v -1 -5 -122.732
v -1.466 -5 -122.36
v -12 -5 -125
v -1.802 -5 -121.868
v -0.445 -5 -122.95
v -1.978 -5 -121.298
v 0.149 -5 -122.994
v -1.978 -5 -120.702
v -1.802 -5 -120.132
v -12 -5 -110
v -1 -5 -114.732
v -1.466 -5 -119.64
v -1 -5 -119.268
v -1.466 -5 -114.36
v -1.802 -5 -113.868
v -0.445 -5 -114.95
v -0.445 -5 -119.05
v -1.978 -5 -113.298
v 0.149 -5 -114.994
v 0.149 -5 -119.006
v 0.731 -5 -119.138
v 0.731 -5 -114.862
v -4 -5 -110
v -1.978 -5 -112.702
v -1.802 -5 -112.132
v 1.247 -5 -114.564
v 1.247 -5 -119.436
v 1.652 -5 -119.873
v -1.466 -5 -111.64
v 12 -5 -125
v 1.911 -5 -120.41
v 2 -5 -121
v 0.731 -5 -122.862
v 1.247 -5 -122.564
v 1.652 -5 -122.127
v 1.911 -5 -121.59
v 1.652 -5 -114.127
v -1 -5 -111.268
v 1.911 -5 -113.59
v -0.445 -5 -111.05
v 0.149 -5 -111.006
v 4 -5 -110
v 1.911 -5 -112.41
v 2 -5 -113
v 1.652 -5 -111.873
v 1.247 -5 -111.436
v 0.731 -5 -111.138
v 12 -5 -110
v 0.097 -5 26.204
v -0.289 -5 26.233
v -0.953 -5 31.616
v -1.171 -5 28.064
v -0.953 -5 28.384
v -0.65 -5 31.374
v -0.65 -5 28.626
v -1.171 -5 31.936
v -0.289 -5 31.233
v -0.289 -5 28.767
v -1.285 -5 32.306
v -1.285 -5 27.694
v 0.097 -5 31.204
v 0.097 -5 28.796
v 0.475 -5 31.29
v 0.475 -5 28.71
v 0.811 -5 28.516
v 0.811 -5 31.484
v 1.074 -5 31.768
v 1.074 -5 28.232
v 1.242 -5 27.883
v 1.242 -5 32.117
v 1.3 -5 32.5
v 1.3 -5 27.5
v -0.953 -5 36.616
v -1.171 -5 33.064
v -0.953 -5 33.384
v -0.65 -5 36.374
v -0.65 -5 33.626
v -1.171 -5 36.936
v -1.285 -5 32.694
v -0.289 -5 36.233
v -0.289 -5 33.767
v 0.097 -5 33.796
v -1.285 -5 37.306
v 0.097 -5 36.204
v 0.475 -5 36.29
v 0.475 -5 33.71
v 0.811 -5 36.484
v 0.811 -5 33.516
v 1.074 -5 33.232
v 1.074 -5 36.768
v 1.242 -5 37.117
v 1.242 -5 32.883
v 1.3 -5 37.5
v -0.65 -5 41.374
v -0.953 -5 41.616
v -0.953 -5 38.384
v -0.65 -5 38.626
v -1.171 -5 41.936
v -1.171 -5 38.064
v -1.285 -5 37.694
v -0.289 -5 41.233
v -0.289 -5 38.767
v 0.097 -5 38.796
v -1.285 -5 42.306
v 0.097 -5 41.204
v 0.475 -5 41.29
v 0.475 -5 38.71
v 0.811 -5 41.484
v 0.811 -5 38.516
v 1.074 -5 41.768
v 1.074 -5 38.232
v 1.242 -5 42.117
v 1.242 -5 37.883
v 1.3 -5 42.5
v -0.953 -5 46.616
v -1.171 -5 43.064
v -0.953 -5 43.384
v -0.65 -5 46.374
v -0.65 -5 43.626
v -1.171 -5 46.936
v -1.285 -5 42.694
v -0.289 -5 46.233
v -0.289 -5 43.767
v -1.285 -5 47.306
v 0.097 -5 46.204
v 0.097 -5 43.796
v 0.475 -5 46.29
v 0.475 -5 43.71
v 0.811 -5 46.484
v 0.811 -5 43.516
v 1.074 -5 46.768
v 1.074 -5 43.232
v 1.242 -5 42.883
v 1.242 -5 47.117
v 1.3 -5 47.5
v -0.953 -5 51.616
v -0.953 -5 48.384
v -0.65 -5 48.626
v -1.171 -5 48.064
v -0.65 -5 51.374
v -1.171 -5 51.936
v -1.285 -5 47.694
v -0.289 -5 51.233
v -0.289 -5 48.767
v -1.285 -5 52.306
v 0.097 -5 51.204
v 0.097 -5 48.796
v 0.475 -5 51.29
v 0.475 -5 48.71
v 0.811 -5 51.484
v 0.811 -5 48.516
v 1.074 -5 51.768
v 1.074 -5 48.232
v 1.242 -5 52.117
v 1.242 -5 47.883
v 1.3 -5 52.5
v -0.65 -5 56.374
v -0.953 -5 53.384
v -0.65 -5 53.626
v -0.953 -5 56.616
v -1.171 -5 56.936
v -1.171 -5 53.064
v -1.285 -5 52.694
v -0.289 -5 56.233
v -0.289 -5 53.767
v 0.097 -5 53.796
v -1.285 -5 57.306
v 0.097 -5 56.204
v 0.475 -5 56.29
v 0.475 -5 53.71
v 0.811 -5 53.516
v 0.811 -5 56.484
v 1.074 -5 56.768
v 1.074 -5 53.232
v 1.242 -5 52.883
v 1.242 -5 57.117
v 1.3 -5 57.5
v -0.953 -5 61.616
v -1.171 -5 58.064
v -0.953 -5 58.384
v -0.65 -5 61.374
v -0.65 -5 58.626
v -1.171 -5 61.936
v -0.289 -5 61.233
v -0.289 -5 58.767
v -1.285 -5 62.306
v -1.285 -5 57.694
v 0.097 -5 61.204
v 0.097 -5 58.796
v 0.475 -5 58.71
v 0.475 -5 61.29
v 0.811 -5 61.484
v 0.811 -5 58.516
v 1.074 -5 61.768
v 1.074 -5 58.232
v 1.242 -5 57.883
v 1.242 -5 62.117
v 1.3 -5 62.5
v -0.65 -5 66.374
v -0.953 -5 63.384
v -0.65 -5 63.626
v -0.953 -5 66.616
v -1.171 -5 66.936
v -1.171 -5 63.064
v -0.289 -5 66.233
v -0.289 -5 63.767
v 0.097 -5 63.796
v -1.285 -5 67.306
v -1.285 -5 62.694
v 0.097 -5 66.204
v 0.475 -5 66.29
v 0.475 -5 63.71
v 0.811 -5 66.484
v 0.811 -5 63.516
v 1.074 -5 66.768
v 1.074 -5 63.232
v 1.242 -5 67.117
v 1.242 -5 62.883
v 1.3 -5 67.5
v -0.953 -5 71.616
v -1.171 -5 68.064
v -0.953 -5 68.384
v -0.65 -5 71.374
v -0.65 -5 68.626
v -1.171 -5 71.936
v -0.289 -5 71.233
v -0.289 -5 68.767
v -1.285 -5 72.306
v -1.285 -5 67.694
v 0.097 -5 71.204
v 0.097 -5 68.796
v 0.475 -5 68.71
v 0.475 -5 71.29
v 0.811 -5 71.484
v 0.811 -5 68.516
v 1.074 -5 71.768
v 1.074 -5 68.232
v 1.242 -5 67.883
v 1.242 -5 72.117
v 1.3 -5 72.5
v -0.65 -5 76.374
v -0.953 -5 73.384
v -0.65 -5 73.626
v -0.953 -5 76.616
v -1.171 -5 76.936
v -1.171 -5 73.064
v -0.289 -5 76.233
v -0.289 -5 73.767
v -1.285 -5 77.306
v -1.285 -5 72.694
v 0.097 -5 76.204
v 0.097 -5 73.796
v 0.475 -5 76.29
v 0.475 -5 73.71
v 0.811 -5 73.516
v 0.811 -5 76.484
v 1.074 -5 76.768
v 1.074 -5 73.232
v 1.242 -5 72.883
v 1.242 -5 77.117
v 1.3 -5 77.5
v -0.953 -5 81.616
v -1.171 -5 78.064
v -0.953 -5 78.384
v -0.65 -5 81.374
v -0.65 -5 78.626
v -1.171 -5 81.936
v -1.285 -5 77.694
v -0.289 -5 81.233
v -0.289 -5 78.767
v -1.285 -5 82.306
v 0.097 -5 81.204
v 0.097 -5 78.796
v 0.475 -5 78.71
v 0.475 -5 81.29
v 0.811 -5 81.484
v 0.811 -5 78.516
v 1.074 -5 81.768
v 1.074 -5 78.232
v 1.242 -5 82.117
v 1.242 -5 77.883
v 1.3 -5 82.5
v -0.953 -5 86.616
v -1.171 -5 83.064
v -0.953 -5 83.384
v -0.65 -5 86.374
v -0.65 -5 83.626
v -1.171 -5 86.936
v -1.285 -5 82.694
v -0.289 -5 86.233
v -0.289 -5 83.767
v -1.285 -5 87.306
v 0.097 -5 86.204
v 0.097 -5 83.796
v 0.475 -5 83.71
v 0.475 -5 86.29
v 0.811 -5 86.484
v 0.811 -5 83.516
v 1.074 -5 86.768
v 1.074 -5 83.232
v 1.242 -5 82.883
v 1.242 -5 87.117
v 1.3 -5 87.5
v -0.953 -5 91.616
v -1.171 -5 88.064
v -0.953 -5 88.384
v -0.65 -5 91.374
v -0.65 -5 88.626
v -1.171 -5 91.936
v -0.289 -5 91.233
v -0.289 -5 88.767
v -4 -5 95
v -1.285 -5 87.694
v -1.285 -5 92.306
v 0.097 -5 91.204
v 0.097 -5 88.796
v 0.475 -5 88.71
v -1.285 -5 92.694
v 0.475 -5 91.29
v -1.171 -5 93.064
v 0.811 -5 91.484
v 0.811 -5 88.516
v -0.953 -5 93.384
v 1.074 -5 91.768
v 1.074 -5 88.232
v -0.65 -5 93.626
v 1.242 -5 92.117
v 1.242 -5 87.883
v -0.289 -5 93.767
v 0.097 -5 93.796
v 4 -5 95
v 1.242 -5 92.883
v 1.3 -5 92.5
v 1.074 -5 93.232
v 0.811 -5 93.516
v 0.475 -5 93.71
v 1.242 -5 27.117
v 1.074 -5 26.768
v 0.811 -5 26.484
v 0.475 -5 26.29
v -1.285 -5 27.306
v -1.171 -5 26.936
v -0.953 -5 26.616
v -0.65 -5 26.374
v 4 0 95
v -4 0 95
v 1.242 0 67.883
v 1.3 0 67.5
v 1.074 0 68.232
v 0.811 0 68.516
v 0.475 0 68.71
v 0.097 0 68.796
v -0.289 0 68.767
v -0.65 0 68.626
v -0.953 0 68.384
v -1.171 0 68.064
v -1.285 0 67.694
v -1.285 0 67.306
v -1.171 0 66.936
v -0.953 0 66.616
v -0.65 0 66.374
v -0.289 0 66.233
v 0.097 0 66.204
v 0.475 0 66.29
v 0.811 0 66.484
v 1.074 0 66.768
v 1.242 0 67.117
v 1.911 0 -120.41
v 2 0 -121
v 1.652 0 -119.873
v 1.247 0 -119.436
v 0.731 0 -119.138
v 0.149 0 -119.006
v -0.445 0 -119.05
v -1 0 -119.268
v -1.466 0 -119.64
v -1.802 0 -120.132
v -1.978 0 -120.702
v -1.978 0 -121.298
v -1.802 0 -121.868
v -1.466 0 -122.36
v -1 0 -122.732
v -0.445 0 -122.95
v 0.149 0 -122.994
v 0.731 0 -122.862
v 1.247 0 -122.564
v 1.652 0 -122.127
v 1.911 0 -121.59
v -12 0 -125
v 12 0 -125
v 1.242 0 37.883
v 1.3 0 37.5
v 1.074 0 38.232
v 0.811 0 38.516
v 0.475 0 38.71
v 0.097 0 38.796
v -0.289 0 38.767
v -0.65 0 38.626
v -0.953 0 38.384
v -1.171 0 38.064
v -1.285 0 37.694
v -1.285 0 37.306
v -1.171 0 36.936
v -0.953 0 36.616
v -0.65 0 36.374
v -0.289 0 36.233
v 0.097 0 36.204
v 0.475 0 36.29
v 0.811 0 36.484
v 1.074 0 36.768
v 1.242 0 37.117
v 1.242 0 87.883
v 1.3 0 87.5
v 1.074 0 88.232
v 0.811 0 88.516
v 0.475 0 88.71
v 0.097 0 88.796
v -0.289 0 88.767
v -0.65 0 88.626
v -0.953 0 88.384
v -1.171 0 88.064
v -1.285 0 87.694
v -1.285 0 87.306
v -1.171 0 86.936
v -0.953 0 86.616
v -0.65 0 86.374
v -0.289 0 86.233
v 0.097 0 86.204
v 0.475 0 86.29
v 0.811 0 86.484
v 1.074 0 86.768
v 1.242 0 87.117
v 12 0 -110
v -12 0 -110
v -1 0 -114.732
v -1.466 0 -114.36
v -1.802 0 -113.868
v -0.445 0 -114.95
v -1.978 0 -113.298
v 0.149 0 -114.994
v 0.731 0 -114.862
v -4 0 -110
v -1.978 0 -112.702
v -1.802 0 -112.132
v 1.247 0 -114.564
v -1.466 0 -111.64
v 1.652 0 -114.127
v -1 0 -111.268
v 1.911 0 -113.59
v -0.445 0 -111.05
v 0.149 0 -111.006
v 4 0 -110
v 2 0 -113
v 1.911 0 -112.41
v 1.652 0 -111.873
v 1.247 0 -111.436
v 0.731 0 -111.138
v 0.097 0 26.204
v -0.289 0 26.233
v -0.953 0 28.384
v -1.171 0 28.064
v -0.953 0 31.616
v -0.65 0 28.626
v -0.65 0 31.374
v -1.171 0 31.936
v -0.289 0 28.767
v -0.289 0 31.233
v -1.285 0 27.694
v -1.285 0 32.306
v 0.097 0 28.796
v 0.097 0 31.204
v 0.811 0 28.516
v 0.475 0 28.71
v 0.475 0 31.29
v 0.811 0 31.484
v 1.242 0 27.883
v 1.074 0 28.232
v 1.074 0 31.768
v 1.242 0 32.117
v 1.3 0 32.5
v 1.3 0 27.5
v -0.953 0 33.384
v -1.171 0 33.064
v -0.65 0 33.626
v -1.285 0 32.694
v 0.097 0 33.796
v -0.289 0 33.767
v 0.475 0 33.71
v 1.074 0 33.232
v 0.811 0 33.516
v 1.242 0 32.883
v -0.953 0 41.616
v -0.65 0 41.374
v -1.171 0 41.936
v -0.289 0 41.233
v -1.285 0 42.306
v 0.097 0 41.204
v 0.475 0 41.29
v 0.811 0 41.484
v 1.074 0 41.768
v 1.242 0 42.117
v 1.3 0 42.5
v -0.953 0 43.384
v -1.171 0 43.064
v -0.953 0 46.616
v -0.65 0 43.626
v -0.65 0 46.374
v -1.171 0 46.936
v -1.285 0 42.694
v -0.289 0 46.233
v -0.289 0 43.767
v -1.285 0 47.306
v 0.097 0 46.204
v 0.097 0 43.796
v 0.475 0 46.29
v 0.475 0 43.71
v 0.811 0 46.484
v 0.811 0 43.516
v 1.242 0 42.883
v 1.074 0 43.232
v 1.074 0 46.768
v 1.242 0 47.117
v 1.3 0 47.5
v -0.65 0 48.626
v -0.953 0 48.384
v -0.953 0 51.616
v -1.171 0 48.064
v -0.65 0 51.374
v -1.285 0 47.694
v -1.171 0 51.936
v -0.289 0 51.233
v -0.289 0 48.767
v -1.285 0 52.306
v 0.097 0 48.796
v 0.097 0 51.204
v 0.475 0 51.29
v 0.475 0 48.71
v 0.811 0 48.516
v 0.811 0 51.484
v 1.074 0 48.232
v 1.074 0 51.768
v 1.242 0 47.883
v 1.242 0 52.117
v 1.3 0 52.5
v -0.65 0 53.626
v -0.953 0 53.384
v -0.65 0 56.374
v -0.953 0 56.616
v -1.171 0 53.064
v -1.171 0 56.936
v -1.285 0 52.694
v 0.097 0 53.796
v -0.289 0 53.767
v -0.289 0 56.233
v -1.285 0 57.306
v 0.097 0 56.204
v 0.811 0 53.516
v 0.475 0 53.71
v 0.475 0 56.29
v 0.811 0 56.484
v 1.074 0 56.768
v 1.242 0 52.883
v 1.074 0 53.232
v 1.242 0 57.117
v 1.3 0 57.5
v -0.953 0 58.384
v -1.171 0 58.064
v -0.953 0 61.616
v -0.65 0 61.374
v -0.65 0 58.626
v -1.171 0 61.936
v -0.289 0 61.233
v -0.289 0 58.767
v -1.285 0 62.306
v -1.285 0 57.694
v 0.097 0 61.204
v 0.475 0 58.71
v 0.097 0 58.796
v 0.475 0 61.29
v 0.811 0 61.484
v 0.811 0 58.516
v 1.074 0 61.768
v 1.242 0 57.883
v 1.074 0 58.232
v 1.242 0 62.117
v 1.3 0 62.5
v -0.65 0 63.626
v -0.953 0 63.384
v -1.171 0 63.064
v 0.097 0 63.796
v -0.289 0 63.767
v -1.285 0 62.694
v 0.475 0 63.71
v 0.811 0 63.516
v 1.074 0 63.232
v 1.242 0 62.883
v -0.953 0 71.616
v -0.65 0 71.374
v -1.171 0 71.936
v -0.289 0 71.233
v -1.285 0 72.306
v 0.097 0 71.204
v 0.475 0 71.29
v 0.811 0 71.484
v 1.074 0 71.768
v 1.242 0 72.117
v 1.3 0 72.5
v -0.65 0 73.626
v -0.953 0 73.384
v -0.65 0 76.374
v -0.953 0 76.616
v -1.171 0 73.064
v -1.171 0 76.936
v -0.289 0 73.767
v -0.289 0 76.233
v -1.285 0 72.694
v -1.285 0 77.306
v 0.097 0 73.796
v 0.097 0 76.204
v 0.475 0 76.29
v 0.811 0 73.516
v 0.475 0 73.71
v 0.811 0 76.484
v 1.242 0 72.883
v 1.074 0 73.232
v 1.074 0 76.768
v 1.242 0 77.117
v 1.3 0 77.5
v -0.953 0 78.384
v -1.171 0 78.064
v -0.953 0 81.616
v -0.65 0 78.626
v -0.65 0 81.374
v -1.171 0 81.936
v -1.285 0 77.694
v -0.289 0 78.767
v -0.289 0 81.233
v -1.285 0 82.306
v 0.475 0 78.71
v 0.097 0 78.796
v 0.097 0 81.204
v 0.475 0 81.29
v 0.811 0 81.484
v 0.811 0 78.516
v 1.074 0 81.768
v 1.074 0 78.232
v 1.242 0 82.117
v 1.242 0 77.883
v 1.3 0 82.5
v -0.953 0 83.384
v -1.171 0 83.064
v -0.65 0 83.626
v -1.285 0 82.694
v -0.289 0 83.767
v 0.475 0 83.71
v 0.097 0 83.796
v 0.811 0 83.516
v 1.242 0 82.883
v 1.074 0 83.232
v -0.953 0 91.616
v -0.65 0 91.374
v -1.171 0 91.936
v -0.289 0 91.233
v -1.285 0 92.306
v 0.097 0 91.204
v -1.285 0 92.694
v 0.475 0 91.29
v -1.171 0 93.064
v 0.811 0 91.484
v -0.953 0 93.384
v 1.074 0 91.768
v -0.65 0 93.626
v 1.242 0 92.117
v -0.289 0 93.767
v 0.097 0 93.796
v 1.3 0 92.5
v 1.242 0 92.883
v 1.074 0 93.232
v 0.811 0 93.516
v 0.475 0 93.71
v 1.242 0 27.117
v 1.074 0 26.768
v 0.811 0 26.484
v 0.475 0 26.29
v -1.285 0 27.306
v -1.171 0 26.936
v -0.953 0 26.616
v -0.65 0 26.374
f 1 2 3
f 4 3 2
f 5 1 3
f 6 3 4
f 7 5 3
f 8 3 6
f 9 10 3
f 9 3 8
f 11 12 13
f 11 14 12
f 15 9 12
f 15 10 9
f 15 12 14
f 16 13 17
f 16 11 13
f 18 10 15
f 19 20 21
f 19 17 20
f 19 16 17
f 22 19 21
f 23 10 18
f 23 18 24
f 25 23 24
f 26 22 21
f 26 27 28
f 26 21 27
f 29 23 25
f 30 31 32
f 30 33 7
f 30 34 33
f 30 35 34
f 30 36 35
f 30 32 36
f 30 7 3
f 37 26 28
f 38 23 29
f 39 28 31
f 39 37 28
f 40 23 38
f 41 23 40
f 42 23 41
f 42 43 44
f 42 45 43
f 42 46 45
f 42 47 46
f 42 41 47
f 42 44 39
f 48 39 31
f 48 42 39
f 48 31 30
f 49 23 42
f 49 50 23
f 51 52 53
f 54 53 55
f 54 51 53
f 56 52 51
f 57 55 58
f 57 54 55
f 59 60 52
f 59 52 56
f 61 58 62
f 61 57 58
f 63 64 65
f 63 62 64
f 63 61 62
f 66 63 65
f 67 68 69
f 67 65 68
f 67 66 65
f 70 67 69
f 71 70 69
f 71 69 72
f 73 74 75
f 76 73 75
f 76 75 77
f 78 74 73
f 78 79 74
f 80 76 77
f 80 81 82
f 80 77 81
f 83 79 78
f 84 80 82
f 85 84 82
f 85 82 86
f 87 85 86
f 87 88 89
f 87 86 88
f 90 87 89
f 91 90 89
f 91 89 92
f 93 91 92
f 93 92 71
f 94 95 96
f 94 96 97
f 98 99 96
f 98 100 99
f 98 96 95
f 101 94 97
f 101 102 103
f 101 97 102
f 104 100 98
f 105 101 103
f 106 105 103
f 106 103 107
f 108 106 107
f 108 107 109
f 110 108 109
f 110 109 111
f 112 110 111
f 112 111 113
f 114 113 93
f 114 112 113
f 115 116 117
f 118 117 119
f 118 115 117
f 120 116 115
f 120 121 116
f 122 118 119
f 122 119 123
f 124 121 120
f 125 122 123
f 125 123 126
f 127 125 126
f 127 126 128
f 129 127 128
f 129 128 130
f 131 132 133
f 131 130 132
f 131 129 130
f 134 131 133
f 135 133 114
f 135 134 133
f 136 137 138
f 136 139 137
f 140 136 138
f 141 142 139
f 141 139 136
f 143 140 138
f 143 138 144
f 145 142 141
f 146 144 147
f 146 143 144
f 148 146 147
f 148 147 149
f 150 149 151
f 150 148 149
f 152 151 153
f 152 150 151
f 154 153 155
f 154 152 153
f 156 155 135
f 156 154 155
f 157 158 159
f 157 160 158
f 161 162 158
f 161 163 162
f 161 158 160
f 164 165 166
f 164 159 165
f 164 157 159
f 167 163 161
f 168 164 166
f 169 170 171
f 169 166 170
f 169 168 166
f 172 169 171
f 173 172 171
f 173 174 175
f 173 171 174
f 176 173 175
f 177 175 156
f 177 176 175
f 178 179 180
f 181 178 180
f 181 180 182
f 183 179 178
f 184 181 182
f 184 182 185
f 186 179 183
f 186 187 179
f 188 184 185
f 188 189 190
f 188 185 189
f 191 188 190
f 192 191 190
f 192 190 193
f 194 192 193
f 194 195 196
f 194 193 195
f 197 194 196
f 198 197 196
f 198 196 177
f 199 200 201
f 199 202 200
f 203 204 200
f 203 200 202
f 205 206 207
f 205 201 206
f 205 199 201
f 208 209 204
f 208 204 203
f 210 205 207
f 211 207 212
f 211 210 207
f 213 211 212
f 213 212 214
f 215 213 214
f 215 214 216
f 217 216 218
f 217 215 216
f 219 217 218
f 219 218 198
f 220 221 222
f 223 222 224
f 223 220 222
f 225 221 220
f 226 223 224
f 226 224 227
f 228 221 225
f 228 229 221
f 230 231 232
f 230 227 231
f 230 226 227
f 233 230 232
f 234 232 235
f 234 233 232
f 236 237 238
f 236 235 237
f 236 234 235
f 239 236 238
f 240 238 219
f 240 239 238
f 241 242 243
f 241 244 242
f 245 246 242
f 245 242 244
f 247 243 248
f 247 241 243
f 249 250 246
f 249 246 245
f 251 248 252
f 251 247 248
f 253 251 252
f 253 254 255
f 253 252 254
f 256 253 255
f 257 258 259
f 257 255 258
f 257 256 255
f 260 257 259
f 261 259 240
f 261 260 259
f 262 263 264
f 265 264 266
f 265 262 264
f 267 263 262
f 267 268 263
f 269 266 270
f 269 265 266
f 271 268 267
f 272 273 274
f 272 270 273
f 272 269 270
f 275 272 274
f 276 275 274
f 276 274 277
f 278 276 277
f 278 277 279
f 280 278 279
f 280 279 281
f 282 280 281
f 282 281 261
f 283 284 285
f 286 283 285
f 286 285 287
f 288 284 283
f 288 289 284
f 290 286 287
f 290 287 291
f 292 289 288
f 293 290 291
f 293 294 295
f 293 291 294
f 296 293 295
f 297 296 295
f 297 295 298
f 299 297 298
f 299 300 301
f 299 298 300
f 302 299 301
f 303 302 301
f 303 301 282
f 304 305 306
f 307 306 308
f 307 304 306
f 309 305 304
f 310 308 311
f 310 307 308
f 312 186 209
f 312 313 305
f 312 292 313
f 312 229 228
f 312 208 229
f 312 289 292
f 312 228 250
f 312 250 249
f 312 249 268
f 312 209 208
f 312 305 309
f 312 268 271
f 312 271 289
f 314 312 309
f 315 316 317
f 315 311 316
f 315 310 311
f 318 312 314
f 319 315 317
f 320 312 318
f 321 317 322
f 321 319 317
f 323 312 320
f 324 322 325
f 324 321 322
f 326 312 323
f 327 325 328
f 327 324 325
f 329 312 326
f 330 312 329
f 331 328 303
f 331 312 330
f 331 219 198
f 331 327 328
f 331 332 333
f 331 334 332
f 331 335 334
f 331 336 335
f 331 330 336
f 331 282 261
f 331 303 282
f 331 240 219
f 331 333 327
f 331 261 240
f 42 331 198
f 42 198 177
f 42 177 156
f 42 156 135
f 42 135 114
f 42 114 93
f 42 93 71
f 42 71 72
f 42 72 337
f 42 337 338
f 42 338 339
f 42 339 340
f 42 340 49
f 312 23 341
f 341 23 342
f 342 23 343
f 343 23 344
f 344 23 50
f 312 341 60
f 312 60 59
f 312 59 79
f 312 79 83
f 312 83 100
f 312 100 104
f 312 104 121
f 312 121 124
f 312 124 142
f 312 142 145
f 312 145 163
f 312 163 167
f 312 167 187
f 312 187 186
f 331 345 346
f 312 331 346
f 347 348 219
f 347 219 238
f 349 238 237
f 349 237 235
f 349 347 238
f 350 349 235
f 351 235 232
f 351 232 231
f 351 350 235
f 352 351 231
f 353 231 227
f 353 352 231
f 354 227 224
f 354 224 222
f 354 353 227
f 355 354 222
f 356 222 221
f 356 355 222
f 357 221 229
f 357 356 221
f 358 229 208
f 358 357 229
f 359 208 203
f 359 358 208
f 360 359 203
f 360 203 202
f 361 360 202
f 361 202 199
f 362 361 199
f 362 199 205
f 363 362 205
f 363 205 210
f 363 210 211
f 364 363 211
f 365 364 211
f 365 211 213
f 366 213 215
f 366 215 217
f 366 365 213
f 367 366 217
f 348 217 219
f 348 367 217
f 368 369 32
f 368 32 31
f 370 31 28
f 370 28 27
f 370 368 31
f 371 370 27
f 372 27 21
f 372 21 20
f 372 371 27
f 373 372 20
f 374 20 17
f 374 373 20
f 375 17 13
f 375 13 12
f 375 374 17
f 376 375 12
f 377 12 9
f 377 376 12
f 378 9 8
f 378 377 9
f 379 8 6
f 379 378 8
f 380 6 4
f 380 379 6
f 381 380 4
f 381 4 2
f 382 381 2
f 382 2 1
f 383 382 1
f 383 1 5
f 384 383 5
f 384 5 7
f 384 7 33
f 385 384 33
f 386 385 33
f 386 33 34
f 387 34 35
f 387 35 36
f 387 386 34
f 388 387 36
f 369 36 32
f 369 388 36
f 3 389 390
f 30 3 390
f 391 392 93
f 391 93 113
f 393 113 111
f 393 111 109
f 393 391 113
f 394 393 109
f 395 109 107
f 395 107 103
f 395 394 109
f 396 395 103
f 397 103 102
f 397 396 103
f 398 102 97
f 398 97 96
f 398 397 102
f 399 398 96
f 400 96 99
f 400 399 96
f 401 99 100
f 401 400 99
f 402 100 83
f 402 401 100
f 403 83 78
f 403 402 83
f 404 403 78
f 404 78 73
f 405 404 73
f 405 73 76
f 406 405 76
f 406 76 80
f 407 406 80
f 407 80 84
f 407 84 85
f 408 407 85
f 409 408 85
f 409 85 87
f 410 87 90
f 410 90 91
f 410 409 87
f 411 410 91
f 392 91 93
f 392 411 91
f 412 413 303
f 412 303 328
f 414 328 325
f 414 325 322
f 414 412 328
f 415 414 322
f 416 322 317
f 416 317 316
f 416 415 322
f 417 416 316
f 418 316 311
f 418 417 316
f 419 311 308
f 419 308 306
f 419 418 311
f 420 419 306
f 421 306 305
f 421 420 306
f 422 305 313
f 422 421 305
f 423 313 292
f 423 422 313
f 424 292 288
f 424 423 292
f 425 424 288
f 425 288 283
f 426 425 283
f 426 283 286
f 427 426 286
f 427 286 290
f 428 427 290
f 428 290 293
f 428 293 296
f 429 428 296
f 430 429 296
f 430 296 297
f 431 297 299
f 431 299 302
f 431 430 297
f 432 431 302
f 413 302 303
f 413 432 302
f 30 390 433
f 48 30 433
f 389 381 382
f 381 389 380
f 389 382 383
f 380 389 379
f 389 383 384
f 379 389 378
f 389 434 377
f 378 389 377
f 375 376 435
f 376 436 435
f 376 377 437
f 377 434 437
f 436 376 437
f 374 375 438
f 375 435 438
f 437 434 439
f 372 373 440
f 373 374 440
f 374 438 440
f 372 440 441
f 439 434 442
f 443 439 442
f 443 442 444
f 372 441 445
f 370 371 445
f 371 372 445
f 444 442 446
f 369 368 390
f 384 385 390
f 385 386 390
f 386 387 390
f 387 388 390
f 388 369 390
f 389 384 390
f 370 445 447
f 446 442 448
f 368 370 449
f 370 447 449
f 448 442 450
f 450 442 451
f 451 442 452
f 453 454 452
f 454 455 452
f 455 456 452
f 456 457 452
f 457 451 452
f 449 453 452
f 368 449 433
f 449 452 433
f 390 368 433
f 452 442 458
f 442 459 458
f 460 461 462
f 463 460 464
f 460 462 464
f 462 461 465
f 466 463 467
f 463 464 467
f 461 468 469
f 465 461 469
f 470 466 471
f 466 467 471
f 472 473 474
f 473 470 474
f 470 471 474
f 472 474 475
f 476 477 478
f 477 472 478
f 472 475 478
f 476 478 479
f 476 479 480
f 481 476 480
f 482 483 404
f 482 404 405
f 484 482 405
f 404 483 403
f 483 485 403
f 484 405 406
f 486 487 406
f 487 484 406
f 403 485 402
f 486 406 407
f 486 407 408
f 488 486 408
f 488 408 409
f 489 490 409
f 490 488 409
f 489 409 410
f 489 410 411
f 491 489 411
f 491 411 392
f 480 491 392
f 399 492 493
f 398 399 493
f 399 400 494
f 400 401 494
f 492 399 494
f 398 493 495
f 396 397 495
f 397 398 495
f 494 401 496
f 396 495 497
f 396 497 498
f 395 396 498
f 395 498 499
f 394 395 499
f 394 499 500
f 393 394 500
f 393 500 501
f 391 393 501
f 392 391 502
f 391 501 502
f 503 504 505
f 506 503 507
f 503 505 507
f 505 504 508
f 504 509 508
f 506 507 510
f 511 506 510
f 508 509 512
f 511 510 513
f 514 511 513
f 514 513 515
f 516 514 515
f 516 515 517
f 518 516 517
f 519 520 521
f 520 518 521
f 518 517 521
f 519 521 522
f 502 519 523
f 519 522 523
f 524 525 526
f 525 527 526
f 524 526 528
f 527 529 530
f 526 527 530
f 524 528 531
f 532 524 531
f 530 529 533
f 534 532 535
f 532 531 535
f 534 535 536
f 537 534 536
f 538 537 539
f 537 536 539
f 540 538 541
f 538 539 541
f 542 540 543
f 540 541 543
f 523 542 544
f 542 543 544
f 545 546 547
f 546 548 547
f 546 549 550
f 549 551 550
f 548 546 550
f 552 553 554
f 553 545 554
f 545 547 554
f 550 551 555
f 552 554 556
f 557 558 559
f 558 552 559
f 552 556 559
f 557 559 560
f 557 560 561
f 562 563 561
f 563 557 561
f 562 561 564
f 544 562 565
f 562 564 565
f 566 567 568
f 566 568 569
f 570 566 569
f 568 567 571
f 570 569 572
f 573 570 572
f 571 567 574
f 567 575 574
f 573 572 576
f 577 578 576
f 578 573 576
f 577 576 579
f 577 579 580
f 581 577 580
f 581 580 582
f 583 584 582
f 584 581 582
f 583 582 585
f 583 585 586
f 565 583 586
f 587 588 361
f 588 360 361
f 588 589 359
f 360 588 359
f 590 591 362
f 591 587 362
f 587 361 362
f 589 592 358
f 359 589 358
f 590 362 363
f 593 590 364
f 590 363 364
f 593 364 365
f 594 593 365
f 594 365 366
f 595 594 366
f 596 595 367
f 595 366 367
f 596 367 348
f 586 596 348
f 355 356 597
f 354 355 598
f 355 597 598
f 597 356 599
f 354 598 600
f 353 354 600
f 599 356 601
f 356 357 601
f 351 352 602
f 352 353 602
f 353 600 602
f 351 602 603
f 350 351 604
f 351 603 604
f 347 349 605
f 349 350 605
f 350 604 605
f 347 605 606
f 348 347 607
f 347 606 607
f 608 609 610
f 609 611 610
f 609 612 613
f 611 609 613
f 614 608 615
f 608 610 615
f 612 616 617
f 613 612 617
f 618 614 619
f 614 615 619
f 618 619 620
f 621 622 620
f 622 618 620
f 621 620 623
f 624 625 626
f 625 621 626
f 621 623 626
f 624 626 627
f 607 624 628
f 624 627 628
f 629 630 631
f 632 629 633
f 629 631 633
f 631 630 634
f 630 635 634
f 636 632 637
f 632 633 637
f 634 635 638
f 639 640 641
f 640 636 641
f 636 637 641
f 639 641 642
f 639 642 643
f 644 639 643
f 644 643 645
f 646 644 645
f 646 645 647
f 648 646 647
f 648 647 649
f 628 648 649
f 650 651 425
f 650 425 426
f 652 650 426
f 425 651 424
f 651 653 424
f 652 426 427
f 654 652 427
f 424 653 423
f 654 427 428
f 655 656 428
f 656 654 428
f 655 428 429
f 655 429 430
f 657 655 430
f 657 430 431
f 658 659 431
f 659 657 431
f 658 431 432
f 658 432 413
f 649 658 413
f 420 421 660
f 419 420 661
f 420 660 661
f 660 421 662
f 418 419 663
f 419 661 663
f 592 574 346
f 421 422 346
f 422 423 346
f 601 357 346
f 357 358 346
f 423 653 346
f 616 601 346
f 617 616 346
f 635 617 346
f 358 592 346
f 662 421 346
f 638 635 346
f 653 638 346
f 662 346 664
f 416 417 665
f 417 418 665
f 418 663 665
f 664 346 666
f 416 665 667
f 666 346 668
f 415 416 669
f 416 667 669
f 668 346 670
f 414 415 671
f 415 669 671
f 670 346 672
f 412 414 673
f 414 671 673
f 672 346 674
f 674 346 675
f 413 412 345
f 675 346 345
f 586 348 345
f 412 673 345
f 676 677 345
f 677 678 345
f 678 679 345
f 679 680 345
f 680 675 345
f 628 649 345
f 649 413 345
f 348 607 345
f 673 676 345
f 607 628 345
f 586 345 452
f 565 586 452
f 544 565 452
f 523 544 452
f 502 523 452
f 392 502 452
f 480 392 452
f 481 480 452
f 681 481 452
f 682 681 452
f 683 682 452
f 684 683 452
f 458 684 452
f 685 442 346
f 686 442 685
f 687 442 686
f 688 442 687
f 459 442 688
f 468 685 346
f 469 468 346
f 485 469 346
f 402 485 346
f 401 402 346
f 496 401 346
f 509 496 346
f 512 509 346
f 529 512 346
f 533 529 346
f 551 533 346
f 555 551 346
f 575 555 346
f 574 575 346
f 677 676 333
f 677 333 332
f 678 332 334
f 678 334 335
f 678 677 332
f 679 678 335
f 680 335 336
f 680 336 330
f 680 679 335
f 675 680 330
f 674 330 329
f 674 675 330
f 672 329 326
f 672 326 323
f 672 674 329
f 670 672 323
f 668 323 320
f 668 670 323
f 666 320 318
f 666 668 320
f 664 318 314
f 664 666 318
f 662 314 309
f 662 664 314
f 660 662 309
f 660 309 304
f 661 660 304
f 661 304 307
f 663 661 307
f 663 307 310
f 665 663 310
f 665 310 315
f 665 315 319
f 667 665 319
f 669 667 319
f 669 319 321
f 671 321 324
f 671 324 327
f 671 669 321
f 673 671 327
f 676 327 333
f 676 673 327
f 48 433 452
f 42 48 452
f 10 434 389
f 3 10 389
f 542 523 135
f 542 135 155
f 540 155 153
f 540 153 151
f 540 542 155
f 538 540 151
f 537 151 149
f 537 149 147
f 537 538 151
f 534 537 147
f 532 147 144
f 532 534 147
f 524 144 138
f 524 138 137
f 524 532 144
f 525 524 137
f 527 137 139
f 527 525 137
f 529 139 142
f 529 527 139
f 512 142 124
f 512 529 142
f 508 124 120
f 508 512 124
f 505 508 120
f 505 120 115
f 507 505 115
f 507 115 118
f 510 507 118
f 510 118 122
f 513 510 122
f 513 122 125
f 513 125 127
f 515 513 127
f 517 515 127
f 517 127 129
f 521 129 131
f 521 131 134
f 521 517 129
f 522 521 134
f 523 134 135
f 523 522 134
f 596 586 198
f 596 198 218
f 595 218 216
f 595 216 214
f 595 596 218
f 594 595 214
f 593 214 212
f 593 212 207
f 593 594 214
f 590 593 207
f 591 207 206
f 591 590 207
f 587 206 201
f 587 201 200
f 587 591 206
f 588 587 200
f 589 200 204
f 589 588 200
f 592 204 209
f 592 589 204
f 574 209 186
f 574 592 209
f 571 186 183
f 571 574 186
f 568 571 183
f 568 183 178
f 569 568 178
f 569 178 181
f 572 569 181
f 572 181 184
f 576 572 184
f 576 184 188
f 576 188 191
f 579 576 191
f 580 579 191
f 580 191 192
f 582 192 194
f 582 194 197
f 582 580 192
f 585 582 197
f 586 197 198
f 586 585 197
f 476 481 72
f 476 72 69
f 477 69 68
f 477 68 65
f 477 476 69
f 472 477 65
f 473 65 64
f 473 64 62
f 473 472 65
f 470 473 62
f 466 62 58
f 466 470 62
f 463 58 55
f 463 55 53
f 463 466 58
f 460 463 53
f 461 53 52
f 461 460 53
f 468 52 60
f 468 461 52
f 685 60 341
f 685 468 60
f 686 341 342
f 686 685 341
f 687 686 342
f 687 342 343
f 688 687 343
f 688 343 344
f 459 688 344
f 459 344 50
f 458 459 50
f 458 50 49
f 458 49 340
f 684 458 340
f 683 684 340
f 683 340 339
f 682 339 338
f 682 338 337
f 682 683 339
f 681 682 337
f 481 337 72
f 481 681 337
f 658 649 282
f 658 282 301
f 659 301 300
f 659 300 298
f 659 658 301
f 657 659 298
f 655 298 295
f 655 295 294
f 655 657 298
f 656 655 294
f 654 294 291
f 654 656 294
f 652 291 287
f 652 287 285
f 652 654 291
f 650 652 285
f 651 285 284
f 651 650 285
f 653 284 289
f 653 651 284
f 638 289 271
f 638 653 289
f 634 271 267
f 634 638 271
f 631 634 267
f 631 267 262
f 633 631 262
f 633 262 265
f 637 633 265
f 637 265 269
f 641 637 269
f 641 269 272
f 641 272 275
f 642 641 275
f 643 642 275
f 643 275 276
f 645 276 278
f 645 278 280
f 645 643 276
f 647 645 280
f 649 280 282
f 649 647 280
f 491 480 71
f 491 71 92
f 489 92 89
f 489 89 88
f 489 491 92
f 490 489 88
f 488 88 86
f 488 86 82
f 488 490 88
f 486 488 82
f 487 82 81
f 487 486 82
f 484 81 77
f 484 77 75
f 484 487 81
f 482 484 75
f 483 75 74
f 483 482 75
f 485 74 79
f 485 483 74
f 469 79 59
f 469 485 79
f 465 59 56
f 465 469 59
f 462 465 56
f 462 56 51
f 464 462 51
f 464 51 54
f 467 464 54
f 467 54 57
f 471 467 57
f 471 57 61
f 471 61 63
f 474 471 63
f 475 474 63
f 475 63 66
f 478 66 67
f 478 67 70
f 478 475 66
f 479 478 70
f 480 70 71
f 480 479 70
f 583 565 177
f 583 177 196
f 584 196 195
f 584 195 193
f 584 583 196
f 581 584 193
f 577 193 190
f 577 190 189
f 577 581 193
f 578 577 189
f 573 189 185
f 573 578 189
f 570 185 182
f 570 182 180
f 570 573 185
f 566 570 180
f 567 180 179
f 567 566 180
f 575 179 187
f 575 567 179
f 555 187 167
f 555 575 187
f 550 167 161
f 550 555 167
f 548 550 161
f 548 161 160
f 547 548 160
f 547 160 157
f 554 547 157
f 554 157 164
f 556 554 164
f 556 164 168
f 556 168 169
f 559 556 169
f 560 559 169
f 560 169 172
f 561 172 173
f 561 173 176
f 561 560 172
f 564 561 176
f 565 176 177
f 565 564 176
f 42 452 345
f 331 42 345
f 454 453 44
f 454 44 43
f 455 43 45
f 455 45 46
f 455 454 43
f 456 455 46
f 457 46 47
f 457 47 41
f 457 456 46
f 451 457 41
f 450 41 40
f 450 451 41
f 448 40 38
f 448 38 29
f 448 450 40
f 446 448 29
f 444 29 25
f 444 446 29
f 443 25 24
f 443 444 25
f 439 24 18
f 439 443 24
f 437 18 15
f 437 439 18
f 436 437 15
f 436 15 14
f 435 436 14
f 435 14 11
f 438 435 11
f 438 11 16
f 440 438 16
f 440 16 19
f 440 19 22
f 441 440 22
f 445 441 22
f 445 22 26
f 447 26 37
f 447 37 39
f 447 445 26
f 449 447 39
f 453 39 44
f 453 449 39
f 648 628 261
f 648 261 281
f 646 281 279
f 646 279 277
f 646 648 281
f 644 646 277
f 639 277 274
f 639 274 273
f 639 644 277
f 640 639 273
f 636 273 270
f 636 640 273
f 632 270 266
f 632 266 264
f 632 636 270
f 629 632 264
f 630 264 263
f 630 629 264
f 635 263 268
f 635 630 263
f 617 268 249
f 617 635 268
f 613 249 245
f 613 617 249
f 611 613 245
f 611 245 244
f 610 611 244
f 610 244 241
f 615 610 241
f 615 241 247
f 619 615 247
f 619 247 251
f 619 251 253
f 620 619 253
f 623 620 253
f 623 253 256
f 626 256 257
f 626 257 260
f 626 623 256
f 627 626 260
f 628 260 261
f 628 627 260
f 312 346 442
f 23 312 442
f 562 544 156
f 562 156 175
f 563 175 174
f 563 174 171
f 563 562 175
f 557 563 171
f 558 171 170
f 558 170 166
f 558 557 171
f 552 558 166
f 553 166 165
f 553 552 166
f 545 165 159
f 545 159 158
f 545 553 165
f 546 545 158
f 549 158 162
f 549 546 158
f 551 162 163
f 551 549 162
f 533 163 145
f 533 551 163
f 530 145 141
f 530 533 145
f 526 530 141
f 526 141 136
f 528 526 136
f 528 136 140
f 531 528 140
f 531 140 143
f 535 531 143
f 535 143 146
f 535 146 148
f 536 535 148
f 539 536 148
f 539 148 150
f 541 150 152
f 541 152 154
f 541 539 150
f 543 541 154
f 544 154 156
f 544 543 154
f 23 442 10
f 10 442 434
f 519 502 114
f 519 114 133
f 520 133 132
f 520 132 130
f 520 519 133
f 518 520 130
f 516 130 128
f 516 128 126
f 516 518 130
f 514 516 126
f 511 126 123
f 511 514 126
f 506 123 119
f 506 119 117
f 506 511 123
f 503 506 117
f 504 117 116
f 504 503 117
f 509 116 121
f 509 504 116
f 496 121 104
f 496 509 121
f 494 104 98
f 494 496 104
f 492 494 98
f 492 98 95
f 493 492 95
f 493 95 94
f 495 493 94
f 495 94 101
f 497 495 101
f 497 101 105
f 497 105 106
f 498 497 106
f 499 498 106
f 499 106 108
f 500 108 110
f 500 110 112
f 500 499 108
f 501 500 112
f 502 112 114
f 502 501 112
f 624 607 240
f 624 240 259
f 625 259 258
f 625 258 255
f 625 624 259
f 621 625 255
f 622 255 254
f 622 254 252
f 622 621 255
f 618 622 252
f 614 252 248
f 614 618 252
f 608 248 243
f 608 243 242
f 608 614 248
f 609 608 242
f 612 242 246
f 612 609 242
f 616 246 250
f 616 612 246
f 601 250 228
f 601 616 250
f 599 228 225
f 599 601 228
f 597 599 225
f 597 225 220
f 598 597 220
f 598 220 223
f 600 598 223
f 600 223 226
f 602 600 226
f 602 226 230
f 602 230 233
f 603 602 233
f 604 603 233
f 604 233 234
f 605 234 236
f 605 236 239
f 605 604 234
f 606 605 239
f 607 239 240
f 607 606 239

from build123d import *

# Parameters (mm, degrees)
F0_R     = 2
F0_R_2   = 1.3
F1_DEPTH = 5


with BuildPart() as f1:
    # F0 (on Front) → F1 (new body)
    with BuildSketch(Plane.XZ):
        Polygon((-4, -125), (4, -125), (12, -125), (12, -110), (4, -110), (4, 95), (-4, 95), (-4, -110), (-12, -110), (-12, -125), align=None)
        with Locations((0, -121)):
            Circle(F0_R, mode=Mode.SUBTRACT)
        with Locations((0, -113)):
            Circle(F0_R, mode=Mode.SUBTRACT)
        with Locations((0, 27.5)):
            Circle(F0_R_2, mode=Mode.SUBTRACT)
        with Locations((0, 32.5)):
            Circle(F0_R_2, mode=Mode.SUBTRACT)
        with Locations((0, 37.5)):
            Circle(F0_R_2, mode=Mode.SUBTRACT)
        with Locations((0, 42.5)):
            Circle(F0_R_2, mode=Mode.SUBTRACT)
        with Locations((0, 47.5)):
            Circle(F0_R_2, mode=Mode.SUBTRACT)
        with Locations((0, 52.5)):
            Circle(F0_R_2, mode=Mode.SUBTRACT)
        with Locations((0, 57.5)):
            Circle(F0_R_2, mode=Mode.SUBTRACT)
        with Locations((0, 62.5)):
            Circle(F0_R_2, mode=Mode.SUBTRACT)
        with Locations((0, 67.5)):
            Circle(F0_R_2, mode=Mode.SUBTRACT)
        with Locations((0, 72.5)):
            Circle(F0_R_2, mode=Mode.SUBTRACT)
        with Locations((0, 77.5)):
            Circle(F0_R_2, mode=Mode.SUBTRACT)
        with Locations((0, 82.5)):
            Circle(F0_R_2, mode=Mode.SUBTRACT)
        with Locations((0, 87.5)):
            Circle(F0_R_2, mode=Mode.SUBTRACT)
        with Locations((0, 92.5)):
            Circle(F0_R_2, mode=Mode.SUBTRACT)
    extrude(amount=F1_DEPTH)


solid = f1.part
